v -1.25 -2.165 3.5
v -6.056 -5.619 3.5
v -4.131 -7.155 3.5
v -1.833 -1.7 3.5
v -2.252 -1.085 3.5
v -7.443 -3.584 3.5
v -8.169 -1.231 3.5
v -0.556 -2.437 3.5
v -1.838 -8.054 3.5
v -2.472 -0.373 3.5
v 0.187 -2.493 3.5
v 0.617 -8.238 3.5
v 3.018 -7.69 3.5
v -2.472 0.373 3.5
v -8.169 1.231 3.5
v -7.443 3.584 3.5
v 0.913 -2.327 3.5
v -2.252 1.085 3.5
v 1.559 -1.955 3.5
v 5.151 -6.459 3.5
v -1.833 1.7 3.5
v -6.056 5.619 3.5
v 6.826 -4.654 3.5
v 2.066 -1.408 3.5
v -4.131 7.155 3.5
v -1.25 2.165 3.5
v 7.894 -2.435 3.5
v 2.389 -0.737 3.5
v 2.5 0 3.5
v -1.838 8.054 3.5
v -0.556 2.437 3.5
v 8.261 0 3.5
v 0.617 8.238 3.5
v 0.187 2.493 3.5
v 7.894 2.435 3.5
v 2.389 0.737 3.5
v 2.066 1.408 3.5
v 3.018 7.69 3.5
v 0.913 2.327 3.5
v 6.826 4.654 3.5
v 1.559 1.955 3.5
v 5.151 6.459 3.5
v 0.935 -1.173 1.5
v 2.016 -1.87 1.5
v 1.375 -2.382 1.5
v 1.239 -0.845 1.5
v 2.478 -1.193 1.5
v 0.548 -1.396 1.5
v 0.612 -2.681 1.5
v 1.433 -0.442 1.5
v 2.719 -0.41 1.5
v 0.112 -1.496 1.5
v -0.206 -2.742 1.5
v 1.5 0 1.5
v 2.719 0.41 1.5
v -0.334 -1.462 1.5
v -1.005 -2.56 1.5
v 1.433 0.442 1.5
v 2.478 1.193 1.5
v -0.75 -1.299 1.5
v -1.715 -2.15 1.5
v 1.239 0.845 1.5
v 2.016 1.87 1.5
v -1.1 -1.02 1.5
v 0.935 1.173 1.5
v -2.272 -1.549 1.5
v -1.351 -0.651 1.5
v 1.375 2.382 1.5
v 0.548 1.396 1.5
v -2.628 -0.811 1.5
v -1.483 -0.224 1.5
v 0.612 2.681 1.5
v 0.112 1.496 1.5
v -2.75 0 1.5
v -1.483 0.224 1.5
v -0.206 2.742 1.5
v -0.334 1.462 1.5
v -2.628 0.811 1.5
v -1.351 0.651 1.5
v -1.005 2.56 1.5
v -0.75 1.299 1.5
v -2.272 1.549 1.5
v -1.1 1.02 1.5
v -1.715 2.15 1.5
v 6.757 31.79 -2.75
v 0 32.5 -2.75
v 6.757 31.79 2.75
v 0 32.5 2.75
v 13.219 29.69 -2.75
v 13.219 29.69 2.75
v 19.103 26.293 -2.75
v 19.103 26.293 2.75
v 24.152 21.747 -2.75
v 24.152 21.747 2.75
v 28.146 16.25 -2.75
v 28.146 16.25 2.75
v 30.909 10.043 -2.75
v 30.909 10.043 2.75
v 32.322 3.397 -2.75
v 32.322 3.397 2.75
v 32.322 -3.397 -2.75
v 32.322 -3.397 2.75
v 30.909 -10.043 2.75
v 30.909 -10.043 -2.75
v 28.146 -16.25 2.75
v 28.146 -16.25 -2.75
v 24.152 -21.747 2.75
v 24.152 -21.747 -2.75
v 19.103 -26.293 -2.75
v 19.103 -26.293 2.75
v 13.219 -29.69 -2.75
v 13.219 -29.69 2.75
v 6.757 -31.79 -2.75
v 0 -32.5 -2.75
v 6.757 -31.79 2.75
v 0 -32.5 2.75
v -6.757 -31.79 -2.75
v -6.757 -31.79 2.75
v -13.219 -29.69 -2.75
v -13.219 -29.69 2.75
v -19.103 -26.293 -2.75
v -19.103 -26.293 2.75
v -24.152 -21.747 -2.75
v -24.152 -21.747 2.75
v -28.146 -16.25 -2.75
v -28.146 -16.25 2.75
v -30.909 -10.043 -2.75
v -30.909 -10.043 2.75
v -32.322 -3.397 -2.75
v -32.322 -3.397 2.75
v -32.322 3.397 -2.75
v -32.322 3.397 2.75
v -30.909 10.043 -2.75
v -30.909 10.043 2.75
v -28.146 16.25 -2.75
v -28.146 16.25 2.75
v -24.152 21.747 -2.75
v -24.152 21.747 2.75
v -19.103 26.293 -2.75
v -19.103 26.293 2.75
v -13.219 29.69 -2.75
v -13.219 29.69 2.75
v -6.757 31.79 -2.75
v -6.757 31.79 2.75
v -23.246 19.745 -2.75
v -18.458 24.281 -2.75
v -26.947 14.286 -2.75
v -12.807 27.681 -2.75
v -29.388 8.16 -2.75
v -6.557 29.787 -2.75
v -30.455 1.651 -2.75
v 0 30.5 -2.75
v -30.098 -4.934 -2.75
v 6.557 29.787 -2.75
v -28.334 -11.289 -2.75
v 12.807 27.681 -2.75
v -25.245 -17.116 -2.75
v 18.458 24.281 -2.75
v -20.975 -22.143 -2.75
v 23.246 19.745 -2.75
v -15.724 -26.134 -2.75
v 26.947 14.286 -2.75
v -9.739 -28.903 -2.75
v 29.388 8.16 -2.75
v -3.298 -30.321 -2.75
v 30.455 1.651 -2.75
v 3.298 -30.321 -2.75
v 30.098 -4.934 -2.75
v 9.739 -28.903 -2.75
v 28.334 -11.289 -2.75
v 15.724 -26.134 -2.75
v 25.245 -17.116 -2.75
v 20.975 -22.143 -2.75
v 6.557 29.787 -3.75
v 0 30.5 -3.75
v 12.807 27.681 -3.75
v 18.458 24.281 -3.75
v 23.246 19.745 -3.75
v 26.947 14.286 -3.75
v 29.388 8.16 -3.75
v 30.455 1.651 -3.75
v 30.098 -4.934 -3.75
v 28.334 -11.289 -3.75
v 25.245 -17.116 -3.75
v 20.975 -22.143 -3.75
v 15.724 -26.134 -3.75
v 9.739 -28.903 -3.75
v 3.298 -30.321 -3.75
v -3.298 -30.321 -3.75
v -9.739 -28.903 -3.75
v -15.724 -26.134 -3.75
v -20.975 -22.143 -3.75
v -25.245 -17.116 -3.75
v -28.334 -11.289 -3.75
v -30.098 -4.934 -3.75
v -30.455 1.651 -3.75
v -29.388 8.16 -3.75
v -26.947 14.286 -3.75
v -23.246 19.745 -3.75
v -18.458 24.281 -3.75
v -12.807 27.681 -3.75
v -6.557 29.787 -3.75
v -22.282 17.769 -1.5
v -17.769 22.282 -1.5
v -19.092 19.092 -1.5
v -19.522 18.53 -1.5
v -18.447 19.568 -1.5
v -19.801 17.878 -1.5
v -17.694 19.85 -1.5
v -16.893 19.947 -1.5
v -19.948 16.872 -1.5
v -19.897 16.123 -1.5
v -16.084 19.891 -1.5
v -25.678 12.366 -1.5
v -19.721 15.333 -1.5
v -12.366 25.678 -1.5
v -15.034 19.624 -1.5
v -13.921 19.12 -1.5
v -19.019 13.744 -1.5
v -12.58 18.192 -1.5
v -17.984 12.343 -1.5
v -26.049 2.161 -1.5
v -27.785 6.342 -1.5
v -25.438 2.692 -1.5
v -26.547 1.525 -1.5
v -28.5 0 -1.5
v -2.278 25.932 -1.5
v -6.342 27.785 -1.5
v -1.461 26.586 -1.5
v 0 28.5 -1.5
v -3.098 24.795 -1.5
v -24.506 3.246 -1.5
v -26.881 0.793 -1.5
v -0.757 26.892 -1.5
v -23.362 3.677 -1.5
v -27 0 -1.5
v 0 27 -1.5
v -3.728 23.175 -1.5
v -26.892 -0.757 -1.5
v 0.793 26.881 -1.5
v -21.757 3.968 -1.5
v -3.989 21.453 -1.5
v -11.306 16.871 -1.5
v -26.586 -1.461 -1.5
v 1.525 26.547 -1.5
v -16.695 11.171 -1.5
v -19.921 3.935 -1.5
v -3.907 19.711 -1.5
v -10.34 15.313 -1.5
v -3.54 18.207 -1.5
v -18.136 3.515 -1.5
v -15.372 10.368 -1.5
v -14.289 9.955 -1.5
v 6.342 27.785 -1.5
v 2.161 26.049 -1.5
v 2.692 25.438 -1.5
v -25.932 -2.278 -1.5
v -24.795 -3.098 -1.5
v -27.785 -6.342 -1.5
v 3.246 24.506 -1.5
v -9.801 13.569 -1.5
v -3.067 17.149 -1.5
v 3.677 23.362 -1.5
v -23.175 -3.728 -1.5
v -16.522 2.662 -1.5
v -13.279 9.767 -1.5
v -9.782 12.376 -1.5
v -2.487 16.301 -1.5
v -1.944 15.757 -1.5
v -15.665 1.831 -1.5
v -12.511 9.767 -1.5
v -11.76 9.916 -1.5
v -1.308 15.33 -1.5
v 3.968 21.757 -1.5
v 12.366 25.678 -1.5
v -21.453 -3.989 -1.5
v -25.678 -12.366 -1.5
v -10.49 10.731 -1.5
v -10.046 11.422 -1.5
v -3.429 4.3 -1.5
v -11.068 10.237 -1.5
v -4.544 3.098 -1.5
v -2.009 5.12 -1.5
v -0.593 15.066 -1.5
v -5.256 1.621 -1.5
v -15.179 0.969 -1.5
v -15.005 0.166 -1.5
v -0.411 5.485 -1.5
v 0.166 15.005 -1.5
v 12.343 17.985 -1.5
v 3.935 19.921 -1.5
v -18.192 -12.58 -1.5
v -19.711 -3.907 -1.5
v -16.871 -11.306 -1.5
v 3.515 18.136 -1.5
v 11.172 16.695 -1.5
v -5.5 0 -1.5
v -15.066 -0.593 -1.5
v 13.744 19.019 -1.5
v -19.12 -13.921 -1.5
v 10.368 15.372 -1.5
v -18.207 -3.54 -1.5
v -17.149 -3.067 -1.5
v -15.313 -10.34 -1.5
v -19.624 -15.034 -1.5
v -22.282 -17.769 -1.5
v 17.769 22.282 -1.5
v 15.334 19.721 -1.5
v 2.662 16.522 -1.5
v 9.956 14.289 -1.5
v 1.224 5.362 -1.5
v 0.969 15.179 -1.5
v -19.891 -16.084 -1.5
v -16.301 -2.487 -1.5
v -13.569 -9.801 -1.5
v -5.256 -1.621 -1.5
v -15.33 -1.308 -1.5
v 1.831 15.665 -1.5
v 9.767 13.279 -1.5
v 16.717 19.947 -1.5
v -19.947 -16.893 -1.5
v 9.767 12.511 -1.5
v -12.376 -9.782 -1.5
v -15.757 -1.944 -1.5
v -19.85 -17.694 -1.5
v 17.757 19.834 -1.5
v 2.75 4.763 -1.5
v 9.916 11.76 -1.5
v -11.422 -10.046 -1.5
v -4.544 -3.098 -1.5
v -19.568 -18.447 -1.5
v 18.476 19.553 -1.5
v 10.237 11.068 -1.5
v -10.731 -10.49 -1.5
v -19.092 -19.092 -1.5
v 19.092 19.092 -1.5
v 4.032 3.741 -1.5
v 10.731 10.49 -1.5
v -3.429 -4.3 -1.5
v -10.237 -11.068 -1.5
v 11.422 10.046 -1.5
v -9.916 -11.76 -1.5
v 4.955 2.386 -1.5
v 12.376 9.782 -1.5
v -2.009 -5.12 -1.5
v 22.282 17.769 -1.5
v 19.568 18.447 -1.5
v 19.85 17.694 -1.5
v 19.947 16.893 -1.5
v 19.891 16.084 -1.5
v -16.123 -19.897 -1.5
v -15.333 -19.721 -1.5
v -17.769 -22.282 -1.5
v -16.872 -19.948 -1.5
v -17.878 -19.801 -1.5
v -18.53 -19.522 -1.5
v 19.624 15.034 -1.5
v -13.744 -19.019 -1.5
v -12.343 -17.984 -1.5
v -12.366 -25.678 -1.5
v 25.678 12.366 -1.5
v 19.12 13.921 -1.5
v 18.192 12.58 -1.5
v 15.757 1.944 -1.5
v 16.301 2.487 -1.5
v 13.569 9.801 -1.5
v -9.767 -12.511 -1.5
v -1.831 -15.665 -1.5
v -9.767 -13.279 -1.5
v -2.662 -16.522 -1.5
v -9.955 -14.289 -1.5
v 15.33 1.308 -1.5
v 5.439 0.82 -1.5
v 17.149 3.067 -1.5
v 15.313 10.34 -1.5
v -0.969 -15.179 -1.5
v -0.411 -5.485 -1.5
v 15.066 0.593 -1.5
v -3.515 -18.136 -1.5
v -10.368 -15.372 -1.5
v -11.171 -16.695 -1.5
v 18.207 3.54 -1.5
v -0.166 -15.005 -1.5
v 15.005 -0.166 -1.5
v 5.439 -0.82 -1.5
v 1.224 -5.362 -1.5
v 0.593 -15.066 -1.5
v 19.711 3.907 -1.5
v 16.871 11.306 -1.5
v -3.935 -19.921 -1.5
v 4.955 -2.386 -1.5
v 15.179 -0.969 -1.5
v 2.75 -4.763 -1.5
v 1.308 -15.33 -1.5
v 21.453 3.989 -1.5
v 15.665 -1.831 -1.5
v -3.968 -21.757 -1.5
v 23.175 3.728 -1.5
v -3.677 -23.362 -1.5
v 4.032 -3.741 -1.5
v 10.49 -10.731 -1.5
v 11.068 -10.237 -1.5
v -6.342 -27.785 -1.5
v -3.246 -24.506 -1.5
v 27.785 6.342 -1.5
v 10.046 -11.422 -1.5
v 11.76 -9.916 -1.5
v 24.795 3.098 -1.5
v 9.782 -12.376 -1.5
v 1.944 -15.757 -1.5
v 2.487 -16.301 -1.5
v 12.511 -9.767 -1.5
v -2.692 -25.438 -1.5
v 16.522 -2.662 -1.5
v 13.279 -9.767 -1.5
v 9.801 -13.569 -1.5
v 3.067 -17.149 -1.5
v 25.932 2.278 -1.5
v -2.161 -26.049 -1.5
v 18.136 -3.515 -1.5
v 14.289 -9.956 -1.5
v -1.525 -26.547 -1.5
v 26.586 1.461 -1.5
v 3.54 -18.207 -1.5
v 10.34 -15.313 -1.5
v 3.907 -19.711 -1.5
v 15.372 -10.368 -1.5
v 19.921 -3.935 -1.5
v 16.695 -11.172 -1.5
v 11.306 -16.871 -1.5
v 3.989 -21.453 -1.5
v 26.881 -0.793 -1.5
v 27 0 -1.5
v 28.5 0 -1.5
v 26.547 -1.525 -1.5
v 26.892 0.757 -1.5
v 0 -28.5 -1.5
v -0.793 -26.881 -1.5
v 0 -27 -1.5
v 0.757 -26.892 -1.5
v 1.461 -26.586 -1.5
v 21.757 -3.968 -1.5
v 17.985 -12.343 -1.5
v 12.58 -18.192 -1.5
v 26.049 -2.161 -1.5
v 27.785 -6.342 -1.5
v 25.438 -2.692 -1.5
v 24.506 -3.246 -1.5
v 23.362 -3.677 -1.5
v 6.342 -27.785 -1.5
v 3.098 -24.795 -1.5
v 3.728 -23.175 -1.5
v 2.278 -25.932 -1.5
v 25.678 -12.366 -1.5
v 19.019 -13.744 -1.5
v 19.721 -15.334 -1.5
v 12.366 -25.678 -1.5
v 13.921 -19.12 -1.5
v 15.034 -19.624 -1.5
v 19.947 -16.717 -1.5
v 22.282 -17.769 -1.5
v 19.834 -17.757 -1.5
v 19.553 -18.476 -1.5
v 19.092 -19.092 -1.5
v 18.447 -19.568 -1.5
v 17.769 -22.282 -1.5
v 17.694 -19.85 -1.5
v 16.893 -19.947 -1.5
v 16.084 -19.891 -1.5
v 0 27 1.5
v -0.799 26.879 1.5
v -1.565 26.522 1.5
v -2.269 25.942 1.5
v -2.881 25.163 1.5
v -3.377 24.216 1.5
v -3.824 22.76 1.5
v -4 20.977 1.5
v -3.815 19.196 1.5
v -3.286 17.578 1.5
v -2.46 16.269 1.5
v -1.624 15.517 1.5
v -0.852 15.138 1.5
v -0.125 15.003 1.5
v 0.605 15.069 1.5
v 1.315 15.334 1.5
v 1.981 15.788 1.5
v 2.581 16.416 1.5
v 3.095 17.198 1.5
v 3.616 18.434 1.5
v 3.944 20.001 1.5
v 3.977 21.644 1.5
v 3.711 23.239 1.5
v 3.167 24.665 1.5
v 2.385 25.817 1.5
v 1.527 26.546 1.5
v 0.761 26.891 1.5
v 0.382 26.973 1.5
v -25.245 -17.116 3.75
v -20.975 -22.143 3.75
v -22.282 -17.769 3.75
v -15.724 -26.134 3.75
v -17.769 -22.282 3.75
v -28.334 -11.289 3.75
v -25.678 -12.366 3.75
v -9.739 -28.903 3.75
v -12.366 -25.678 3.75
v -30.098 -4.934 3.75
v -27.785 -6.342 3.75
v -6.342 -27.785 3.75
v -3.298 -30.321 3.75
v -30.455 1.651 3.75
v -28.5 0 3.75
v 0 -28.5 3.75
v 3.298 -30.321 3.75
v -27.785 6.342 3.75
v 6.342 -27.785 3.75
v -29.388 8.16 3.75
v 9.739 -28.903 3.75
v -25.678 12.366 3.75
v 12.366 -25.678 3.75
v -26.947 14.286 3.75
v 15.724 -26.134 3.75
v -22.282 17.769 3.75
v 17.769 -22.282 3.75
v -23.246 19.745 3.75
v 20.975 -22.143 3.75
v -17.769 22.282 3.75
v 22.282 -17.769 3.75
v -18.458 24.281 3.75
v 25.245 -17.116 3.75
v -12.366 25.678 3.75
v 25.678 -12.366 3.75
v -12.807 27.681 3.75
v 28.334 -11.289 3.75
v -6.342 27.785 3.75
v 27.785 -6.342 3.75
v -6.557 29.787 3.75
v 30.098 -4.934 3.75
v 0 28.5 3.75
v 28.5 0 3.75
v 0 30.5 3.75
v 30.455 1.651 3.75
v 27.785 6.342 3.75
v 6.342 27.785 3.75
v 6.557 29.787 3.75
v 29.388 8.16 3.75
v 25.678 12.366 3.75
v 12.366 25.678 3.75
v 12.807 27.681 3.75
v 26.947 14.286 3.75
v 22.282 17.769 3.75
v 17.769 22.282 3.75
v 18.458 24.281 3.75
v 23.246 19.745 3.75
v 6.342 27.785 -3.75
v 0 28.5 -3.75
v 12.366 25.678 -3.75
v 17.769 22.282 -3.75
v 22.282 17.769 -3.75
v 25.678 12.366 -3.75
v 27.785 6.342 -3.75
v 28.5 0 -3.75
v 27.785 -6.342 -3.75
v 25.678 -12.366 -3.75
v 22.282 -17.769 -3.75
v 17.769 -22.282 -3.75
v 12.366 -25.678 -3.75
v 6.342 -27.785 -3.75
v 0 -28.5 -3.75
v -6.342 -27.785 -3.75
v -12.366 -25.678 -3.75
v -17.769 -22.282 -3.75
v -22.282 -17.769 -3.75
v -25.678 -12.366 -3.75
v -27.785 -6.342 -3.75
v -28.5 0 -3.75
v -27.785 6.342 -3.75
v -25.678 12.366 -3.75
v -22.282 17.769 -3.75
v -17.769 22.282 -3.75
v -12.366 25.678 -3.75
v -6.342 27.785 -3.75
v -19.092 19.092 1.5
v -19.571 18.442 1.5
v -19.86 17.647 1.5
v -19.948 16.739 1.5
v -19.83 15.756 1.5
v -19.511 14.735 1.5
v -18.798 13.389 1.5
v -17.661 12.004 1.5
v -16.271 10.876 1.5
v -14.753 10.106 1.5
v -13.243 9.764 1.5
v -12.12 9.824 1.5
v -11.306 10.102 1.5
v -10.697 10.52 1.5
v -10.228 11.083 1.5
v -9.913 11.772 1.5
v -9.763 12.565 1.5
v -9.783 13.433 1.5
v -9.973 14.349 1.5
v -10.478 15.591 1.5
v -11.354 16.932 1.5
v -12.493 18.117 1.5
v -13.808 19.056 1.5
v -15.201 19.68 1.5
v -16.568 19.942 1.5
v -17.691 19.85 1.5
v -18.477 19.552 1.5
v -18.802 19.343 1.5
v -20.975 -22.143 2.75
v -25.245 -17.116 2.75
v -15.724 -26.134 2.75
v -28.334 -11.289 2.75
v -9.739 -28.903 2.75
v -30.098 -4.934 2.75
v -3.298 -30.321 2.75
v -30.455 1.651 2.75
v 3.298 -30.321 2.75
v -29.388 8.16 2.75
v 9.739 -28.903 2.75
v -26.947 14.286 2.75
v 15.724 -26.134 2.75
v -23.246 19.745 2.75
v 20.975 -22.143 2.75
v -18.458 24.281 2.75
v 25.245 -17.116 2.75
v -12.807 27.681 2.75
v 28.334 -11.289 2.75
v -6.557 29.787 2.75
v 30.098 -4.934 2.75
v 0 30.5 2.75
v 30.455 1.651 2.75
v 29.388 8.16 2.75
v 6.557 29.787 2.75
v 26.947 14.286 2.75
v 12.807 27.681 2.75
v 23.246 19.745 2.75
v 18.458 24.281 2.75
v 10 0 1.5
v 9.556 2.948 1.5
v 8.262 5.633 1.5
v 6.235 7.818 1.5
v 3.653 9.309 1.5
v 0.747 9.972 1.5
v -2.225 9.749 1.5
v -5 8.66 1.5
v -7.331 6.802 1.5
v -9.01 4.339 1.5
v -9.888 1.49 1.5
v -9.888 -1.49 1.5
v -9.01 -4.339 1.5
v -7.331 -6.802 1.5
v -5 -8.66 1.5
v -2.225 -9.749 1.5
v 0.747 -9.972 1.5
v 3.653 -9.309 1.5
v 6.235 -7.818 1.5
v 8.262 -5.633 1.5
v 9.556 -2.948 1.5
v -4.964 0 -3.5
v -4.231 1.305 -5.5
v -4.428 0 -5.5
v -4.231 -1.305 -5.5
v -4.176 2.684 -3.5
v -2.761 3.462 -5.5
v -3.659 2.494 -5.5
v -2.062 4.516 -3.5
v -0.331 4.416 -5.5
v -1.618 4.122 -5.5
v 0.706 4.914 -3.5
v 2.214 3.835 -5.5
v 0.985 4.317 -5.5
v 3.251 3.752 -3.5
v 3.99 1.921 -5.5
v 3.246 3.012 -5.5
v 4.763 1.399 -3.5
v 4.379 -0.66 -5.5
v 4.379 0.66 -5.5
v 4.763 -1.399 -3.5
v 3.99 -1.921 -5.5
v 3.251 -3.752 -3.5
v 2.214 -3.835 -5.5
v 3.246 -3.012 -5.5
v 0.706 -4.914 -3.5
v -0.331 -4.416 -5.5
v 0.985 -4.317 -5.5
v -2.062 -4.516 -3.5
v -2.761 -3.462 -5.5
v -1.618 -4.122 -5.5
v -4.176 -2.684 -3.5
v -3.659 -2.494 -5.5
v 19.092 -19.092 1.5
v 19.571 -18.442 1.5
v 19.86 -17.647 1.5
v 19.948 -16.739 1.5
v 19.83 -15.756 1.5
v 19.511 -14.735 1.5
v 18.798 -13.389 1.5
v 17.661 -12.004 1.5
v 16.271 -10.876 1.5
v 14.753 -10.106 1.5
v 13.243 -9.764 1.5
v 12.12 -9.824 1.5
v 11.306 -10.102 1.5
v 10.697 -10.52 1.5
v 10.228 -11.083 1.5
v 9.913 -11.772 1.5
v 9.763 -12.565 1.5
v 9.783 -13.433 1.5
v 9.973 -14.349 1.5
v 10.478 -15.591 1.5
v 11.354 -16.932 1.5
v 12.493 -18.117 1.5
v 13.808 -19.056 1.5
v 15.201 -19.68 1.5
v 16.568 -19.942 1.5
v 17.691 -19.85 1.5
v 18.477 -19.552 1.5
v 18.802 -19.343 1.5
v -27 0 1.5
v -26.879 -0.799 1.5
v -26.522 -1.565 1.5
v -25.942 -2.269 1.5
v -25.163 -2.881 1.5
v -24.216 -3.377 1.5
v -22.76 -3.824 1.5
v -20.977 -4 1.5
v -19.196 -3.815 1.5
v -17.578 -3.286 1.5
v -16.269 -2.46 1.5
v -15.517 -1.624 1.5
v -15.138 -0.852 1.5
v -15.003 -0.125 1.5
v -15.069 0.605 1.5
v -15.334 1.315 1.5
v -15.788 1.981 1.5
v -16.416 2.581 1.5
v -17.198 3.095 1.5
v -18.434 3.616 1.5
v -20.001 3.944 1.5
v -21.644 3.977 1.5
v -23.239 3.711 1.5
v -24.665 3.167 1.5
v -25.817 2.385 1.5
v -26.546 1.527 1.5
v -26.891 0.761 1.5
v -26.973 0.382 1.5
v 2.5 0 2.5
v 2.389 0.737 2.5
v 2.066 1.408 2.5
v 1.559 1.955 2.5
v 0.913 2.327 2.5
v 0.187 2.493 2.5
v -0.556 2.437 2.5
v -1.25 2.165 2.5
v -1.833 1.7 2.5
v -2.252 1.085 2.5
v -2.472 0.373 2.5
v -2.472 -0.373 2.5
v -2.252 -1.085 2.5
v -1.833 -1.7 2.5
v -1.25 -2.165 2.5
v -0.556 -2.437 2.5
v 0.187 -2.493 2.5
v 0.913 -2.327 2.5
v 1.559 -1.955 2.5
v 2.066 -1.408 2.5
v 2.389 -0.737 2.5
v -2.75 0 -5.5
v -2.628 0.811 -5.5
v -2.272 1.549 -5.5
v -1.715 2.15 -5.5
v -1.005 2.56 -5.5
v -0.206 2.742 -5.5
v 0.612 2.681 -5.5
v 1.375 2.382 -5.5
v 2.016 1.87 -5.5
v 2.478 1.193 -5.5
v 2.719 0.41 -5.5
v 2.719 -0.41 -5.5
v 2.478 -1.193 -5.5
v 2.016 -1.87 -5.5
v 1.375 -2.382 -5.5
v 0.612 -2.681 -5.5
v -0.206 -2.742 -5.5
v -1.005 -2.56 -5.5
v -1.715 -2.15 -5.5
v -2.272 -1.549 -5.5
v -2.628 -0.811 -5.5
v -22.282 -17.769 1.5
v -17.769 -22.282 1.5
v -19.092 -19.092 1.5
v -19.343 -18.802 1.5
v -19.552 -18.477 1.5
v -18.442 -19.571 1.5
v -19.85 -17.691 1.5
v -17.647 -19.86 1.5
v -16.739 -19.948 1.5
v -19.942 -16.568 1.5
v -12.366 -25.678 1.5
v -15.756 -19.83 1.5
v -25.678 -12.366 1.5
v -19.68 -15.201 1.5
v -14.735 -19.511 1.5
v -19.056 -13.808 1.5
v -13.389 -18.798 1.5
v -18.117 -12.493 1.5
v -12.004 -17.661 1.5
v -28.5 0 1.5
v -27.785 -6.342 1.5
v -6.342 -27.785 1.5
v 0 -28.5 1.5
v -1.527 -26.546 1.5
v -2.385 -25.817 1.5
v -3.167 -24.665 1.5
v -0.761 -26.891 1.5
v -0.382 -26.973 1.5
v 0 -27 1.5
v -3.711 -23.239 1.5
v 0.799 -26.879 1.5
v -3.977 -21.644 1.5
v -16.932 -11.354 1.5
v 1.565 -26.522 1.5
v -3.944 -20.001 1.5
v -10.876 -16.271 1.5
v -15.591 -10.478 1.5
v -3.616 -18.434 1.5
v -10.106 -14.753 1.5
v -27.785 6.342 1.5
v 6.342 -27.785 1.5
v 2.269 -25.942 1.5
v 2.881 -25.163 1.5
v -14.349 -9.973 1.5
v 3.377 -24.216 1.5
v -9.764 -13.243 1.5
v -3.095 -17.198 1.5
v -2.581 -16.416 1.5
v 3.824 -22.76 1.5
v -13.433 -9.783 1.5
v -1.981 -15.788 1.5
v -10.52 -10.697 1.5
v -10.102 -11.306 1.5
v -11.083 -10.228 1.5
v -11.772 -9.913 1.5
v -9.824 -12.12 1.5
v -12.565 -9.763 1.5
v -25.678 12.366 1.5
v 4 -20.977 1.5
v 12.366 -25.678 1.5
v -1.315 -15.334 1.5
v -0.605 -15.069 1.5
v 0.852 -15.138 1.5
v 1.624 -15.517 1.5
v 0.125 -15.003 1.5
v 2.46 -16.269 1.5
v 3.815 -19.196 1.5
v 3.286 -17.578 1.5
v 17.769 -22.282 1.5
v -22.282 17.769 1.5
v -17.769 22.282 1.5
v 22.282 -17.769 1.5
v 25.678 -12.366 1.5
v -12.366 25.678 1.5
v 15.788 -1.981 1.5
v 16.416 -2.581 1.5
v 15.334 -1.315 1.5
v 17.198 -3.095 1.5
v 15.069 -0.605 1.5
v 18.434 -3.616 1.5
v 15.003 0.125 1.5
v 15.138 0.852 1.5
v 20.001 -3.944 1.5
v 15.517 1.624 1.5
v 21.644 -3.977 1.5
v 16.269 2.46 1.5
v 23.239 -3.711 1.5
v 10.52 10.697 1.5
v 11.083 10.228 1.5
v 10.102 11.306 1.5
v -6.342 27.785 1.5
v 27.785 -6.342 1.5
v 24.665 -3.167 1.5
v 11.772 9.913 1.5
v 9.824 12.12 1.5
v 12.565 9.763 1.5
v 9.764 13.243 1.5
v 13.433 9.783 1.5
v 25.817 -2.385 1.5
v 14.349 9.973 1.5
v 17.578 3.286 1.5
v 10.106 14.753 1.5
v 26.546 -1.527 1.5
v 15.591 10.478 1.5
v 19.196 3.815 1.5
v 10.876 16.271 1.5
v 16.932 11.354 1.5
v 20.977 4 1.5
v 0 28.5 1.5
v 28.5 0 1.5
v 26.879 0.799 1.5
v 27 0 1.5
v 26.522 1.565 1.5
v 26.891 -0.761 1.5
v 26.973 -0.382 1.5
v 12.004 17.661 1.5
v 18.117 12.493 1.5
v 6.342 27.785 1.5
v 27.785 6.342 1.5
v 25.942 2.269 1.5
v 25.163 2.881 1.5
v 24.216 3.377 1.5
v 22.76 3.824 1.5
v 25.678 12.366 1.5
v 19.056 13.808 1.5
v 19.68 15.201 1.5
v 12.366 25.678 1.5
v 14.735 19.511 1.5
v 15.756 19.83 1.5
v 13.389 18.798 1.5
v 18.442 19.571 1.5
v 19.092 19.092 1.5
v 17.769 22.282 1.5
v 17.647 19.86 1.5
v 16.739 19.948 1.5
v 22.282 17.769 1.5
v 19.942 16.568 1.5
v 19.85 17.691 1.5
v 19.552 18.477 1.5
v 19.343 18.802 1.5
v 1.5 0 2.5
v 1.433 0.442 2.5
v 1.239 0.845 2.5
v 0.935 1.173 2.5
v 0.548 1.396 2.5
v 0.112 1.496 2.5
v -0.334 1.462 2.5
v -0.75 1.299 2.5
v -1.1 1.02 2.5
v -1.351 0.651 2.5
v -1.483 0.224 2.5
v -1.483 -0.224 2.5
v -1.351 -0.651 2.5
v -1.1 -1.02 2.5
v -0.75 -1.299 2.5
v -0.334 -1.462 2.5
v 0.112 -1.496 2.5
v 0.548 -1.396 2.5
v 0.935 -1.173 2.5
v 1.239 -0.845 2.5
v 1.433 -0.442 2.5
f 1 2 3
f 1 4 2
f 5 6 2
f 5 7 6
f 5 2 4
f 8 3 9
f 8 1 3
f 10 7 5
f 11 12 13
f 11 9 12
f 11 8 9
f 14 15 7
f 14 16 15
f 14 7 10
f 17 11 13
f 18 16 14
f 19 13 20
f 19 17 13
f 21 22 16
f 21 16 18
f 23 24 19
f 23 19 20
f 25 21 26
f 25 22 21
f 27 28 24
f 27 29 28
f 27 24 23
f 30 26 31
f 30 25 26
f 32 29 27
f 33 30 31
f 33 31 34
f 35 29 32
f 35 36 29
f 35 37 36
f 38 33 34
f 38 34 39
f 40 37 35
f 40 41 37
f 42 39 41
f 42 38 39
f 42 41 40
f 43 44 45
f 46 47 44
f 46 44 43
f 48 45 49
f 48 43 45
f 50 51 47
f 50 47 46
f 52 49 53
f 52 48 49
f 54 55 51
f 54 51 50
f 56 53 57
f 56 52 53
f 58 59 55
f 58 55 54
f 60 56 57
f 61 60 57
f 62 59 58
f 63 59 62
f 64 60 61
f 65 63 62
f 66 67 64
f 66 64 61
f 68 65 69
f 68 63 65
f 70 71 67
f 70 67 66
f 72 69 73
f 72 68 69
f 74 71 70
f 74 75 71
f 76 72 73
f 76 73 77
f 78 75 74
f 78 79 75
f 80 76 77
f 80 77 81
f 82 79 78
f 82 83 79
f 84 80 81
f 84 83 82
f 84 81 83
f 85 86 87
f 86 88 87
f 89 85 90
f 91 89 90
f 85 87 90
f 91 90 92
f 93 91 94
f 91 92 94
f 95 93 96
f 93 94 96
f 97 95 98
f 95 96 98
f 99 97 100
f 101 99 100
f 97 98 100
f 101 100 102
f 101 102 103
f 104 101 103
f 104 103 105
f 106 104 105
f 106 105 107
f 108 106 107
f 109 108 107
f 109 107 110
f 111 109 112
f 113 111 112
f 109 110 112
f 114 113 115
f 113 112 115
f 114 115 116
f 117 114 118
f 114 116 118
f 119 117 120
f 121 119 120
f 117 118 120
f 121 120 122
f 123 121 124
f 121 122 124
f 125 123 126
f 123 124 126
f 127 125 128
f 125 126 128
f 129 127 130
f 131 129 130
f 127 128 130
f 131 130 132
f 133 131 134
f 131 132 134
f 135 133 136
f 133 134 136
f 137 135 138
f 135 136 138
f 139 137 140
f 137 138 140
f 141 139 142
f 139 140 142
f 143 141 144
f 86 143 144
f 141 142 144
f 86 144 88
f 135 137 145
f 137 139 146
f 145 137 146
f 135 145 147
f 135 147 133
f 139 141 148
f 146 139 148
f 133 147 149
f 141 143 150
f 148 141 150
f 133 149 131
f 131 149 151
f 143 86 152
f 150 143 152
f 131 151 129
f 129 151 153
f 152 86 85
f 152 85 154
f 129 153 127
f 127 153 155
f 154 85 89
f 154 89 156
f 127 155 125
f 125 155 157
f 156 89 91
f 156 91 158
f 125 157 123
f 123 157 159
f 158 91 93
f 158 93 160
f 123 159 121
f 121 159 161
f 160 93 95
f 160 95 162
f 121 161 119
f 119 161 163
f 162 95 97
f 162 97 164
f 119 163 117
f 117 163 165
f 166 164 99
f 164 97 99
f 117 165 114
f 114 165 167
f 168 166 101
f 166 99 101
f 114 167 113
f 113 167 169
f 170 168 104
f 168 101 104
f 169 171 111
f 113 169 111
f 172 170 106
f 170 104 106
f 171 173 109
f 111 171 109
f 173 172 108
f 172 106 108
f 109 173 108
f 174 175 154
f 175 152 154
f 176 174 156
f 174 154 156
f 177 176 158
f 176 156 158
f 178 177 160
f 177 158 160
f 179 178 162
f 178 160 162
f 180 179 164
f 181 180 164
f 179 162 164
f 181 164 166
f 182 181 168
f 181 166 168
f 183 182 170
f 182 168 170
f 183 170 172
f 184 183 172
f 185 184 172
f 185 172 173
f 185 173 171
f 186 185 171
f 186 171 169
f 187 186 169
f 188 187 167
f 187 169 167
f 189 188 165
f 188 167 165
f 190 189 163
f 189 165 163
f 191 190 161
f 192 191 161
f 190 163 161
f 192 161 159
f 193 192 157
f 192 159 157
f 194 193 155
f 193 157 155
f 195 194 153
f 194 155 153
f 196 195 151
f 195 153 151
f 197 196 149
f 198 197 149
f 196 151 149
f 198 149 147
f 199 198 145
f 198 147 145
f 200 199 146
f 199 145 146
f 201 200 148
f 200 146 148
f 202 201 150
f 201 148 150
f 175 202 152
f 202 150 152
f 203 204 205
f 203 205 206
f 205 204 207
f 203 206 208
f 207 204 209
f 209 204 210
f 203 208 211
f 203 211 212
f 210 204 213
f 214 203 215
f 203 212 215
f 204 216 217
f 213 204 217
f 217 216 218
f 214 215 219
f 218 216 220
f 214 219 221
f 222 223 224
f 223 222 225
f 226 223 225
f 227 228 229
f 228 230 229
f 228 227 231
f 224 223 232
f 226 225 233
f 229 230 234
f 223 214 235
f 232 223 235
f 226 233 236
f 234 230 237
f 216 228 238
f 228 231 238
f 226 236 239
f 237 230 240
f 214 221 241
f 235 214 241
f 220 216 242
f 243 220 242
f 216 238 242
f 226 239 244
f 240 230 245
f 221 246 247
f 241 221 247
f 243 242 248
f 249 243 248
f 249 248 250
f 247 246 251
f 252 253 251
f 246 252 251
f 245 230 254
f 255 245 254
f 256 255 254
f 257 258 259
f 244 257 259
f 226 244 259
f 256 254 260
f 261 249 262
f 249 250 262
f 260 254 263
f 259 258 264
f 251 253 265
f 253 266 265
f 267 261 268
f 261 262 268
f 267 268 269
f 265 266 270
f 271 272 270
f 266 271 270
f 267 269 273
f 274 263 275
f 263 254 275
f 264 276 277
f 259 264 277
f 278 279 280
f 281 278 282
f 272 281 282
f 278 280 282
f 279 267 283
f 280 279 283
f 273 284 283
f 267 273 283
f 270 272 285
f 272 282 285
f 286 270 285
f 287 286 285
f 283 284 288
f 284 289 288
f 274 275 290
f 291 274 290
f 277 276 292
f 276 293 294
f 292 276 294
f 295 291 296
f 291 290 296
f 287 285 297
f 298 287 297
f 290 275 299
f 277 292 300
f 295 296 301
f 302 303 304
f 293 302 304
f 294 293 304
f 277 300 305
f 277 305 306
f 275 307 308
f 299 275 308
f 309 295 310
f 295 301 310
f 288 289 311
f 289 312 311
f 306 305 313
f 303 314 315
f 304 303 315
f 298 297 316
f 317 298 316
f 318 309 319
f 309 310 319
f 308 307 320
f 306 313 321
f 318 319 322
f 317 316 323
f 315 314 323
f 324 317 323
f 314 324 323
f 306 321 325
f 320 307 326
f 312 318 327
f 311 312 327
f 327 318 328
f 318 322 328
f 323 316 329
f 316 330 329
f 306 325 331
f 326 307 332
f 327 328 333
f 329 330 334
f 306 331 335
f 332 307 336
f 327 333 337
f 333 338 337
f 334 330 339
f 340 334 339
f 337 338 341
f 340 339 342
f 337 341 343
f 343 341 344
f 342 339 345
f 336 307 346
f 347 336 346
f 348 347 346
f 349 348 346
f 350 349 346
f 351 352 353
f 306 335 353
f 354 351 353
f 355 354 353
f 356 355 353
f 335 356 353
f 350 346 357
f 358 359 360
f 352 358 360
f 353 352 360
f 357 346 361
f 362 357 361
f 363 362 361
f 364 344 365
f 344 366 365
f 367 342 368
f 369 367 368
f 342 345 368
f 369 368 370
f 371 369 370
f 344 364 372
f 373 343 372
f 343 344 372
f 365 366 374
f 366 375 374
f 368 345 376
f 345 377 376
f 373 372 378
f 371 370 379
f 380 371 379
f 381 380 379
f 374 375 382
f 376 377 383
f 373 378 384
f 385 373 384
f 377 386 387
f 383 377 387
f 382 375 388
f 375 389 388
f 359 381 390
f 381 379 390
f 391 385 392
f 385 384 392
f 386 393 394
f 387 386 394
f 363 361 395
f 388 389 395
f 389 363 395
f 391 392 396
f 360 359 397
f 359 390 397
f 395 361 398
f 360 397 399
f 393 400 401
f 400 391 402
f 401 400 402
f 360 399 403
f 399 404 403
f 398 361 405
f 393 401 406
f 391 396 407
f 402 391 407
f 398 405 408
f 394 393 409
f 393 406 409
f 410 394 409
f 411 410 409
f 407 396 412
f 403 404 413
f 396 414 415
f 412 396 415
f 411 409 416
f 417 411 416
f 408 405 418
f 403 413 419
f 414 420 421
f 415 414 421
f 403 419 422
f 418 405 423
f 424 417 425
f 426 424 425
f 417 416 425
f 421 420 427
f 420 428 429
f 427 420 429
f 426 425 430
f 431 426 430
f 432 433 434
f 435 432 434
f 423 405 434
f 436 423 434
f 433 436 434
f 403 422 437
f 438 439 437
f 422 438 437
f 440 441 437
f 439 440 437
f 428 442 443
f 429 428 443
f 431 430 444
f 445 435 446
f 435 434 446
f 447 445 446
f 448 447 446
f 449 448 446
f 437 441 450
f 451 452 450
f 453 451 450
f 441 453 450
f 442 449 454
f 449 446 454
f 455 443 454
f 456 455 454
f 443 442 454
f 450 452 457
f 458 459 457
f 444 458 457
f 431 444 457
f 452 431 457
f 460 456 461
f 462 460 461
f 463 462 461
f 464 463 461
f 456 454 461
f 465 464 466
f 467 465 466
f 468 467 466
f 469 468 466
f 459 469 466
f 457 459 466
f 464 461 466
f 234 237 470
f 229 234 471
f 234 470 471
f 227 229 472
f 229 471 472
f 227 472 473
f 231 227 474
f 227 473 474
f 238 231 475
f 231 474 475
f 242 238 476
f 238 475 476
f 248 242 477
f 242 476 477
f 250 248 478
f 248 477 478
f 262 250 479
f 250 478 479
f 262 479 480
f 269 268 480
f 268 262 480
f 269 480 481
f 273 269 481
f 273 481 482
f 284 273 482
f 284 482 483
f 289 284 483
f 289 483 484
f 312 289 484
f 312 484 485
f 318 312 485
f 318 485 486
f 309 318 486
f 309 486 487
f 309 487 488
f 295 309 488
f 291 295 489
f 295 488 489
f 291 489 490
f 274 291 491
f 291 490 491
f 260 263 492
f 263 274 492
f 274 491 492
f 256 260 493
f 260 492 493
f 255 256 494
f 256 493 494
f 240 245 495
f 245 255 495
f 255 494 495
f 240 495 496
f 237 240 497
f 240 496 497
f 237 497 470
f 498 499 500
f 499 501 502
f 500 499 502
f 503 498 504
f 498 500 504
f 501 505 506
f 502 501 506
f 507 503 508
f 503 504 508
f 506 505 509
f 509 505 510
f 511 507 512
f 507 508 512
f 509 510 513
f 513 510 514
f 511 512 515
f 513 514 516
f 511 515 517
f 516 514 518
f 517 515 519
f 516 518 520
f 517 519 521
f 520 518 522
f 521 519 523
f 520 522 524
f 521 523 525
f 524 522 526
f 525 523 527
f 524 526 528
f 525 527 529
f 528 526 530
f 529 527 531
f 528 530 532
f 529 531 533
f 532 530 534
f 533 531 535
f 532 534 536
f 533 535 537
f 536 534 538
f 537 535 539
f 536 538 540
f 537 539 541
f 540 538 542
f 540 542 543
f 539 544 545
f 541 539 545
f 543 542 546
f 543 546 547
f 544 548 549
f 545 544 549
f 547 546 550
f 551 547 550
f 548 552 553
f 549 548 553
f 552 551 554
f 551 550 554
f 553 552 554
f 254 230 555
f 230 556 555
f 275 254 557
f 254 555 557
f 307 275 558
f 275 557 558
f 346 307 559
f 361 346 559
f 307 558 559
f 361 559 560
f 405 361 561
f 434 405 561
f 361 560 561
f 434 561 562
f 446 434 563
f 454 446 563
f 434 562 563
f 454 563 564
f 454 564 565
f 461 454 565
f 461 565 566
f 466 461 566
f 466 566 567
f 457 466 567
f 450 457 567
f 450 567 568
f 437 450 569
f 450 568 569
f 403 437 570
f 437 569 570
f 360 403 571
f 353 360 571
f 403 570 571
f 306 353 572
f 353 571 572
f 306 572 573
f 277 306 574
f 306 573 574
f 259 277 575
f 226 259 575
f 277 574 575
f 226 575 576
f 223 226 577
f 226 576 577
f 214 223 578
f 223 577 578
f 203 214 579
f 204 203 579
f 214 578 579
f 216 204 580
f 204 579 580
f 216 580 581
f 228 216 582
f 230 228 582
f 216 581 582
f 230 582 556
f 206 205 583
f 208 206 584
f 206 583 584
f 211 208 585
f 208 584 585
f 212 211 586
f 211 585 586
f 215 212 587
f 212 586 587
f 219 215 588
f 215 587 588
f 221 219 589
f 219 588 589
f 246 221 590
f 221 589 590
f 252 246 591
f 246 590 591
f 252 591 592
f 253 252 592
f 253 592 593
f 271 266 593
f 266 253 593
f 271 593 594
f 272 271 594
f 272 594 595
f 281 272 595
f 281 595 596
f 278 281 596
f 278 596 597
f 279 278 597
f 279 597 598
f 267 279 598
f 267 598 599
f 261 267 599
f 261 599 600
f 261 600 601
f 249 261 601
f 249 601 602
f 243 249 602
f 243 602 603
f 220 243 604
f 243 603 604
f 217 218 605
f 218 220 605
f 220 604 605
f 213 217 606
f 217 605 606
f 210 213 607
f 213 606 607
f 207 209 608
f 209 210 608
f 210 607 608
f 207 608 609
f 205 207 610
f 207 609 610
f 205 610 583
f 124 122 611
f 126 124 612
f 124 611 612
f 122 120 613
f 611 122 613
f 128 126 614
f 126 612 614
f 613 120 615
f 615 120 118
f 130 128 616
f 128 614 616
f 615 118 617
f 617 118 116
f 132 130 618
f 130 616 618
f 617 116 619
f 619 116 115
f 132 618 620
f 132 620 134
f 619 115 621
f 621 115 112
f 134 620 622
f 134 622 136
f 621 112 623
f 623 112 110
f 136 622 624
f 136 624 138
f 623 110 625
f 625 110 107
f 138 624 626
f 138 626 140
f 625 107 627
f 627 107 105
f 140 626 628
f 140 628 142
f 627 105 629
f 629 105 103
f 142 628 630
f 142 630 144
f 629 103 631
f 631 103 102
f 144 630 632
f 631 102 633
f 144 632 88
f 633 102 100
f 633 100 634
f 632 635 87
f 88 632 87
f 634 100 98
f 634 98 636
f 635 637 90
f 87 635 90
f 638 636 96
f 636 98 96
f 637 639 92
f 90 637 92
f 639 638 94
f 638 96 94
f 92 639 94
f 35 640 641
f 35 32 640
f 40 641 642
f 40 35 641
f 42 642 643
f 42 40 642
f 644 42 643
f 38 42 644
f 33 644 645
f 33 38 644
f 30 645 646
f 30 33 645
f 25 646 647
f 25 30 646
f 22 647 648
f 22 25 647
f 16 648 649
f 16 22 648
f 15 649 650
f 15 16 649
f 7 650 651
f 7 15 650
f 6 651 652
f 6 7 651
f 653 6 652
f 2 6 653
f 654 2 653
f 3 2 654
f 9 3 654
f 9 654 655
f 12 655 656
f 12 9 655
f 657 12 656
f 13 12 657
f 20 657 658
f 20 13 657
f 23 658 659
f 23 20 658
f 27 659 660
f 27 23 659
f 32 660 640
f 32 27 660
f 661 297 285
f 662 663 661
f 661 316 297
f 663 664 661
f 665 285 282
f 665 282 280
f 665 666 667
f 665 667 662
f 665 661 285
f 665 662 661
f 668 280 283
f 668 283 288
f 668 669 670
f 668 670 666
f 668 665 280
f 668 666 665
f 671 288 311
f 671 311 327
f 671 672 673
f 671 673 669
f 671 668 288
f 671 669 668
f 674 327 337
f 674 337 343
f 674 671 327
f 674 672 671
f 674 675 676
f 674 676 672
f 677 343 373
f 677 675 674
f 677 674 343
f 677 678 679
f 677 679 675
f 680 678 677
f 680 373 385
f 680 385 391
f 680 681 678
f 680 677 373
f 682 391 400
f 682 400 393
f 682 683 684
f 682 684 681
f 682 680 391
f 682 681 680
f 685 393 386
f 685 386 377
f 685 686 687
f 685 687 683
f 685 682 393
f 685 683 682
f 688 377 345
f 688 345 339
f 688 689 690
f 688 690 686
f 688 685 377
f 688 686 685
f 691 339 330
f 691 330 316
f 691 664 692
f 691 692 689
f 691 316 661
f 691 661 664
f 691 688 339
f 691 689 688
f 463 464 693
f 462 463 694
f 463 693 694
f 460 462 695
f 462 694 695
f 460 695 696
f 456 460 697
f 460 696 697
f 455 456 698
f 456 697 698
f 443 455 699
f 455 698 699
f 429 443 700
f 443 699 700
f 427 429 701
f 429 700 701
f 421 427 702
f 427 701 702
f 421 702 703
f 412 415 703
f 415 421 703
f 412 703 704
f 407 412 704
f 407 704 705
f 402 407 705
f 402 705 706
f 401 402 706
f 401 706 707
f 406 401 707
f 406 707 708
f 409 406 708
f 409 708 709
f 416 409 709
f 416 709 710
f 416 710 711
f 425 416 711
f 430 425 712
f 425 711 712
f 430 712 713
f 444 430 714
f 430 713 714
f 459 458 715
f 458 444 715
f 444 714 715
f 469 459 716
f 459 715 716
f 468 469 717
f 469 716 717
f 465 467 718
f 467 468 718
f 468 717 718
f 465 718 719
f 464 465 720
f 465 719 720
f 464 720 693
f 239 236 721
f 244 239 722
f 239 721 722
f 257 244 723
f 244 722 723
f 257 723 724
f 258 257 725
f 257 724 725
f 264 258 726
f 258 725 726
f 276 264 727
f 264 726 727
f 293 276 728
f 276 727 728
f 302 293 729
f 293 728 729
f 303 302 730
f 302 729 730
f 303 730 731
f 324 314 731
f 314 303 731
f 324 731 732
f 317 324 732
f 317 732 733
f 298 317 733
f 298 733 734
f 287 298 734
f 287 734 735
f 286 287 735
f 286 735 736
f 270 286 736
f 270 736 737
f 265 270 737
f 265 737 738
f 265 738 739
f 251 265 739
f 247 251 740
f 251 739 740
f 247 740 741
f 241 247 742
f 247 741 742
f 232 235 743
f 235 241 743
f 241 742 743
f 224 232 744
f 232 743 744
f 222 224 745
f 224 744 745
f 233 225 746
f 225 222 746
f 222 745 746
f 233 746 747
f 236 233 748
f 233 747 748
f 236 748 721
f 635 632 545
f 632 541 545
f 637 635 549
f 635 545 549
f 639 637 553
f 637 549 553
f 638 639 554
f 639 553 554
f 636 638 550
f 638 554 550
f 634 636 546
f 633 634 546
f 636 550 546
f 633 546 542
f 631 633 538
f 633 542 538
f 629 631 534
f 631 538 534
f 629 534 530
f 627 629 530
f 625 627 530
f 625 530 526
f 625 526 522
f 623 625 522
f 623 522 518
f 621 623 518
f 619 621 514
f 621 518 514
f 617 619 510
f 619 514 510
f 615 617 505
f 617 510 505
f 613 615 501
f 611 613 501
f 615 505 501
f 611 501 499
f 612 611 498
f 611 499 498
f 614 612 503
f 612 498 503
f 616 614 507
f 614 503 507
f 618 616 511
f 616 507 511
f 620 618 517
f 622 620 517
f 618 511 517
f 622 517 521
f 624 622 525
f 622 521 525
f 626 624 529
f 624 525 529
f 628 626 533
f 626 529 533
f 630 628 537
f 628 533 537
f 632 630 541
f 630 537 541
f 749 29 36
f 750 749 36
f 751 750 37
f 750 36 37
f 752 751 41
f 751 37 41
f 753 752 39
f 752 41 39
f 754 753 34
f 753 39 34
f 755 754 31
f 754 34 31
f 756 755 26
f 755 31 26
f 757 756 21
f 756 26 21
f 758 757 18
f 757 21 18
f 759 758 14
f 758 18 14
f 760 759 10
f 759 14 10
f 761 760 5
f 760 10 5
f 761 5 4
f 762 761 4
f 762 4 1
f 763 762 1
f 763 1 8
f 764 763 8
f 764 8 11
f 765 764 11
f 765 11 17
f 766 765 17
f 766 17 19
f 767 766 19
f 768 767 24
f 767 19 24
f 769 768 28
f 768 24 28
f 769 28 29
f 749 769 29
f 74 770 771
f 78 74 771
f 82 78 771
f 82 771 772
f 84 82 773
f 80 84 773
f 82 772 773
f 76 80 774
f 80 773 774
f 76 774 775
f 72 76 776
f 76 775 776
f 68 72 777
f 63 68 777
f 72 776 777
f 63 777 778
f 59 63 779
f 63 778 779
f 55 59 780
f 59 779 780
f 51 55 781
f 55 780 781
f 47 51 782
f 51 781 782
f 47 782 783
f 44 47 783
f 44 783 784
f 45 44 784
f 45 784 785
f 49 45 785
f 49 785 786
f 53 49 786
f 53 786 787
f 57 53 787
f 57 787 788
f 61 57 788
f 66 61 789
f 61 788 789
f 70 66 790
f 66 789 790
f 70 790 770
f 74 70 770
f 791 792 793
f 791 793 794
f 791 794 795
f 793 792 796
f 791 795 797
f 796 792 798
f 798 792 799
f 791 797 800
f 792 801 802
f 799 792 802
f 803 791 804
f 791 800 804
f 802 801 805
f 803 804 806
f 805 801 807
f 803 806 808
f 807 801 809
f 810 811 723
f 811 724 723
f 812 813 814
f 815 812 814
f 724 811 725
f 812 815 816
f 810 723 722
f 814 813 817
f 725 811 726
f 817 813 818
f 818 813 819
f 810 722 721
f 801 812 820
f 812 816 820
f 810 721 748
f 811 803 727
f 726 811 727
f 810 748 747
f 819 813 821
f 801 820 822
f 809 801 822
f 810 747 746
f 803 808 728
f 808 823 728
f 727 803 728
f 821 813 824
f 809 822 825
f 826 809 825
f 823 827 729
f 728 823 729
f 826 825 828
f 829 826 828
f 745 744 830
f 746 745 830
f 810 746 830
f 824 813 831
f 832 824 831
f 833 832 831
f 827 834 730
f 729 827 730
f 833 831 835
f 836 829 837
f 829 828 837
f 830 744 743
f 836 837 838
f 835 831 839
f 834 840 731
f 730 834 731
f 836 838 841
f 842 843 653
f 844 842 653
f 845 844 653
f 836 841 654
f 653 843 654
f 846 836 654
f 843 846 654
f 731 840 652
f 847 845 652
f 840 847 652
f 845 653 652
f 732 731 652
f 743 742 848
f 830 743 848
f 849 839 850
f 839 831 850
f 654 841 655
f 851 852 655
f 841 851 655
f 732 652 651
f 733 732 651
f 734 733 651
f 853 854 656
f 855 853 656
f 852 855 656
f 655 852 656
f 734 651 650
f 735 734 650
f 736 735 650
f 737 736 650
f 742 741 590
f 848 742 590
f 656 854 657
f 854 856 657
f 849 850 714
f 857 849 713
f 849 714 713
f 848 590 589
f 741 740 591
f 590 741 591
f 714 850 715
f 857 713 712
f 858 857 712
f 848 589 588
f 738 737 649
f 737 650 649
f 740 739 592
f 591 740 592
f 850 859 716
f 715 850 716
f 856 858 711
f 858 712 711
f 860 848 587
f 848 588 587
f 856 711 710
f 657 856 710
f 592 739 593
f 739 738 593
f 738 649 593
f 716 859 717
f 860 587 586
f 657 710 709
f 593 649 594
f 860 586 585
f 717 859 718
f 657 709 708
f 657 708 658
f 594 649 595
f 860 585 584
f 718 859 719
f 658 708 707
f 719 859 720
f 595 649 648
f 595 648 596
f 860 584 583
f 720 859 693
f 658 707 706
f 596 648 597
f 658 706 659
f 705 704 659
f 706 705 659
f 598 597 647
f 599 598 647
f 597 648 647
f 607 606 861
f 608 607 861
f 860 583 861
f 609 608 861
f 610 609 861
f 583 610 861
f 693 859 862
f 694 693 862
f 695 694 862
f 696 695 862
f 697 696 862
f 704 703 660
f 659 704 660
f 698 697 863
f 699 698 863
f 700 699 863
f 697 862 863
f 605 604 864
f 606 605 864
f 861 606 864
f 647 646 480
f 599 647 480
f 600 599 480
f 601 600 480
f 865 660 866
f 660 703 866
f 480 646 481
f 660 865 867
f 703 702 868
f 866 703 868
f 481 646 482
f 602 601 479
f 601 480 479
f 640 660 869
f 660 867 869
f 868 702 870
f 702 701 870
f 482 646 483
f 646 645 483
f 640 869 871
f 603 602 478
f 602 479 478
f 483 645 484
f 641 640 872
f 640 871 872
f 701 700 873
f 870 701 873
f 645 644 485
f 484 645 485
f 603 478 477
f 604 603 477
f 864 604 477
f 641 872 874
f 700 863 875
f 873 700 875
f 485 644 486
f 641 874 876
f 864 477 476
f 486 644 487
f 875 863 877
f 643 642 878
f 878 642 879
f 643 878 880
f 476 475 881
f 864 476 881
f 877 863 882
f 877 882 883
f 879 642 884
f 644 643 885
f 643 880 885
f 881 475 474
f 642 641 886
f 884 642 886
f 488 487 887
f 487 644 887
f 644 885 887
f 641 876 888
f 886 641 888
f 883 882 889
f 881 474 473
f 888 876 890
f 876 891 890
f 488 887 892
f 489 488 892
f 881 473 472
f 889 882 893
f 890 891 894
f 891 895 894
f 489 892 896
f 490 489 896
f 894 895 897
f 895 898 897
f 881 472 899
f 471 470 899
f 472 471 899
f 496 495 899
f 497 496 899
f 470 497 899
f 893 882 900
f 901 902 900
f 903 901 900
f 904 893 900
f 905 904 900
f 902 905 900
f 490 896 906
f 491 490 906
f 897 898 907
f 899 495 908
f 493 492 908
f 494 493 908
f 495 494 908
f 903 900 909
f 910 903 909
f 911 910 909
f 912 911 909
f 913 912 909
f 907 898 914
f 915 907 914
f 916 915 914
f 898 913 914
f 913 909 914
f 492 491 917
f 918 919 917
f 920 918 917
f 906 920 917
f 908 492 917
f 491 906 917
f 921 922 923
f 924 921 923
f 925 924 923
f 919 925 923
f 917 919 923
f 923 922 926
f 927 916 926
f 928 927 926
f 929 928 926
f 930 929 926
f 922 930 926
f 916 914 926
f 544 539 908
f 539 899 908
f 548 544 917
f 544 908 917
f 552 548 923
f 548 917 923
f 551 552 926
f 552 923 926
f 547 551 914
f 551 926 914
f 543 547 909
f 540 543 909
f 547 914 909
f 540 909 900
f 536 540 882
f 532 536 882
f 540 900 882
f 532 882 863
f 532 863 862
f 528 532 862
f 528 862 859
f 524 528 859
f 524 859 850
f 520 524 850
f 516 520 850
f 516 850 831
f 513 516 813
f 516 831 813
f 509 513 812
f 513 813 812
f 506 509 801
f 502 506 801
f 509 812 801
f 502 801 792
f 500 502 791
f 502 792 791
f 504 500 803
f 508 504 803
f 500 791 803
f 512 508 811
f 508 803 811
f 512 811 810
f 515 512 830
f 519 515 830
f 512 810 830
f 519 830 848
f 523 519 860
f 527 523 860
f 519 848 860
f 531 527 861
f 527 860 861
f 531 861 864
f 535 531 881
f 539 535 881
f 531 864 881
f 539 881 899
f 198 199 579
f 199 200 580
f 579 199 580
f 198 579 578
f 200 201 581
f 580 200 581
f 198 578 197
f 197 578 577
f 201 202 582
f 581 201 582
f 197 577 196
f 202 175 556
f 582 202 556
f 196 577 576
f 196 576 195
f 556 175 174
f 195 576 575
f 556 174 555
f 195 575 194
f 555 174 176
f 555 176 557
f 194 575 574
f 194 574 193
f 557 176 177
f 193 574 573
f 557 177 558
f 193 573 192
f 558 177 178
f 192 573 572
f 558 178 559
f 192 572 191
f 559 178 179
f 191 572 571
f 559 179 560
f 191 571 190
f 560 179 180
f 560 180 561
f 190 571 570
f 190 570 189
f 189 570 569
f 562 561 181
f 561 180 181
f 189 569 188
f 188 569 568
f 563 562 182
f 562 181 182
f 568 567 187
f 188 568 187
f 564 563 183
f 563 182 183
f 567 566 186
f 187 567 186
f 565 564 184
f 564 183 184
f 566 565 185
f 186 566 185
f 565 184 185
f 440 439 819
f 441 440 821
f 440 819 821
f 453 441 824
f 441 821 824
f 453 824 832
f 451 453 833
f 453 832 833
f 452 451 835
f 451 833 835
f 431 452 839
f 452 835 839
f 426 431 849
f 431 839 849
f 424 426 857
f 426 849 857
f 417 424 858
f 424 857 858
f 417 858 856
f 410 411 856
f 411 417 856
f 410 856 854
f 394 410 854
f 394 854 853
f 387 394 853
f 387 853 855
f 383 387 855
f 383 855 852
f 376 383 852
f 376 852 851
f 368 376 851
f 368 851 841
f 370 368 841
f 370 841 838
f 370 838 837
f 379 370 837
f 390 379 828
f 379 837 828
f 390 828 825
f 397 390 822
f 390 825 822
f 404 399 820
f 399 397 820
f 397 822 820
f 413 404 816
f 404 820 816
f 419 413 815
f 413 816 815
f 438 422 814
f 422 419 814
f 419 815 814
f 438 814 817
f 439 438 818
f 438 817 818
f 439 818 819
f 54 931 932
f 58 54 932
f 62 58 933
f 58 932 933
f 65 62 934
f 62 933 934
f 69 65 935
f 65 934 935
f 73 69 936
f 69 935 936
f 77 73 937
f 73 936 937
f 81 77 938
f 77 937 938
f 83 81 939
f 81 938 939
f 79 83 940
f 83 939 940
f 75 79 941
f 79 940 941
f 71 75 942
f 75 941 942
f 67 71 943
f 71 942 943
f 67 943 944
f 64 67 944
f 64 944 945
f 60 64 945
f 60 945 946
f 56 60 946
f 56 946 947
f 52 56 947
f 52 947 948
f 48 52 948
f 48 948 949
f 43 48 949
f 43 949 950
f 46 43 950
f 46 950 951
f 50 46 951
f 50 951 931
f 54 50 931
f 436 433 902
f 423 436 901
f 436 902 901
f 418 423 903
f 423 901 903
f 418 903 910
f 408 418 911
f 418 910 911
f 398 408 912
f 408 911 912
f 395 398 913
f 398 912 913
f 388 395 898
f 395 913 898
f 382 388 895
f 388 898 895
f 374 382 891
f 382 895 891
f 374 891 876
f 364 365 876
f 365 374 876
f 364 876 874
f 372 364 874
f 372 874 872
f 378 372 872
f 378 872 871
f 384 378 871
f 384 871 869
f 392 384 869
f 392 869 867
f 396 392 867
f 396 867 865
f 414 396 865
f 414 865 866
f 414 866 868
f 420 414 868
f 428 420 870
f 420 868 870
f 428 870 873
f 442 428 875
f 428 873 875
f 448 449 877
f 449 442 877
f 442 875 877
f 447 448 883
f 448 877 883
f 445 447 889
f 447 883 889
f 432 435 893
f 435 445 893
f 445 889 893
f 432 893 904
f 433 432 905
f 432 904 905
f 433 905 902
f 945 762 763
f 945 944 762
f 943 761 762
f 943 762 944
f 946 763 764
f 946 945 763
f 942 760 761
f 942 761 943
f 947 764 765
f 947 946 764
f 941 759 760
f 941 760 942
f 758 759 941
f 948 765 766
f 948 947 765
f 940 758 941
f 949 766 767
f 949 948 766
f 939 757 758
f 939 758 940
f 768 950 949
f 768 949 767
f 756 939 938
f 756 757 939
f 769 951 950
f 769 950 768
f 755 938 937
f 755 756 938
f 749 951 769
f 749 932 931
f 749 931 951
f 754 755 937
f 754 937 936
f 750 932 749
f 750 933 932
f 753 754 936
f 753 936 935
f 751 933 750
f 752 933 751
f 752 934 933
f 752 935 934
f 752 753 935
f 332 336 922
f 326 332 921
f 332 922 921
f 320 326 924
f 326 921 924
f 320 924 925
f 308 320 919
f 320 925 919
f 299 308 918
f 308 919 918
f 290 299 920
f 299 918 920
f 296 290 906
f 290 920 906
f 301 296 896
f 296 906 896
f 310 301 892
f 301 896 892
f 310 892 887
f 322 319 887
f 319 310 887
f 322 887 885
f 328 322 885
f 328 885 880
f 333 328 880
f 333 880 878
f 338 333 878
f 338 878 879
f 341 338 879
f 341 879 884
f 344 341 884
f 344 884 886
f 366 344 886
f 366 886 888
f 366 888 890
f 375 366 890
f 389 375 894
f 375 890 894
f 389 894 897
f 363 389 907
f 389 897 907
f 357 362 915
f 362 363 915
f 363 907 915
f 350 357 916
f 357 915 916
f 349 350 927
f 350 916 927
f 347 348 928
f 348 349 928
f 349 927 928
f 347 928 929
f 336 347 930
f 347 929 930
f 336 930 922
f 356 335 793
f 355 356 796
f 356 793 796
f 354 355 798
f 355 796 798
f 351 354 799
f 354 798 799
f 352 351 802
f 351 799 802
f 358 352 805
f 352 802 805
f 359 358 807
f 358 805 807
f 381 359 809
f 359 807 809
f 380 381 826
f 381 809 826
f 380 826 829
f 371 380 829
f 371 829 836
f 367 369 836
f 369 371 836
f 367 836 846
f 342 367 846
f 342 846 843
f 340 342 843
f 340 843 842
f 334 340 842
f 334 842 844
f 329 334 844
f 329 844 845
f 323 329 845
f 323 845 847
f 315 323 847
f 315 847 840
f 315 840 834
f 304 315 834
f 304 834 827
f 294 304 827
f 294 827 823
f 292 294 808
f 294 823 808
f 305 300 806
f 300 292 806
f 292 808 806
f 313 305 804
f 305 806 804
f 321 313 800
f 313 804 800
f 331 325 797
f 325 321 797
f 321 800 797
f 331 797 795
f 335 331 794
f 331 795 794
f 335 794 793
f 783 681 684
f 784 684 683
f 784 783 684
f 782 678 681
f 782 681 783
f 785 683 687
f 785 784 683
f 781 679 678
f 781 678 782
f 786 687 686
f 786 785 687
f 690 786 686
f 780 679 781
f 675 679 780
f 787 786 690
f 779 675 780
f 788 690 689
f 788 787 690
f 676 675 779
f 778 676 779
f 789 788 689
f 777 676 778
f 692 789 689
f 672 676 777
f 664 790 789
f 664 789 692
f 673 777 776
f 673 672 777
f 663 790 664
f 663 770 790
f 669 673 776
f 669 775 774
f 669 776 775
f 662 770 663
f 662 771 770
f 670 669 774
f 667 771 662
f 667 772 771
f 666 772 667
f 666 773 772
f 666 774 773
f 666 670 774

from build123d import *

# Parameters (mm, degrees)
SKETCH2_R           = 10
EXTRUDE1_DEPTH      = 2
EXTRUDE1_TAPER      = 41
SKETCH3_R           = 5.5
EXTRUDE2_DEPTH      = 4
EXTRUDE2_TAPER      = 15
SKETCH4_R           = 2.5
EXTRUDE3_DEPTH      = 1
SKETCH5_R           = 1.5
EXTRUDE4_DEPTH      = 24
EXTRUDE4_DEPTH_BACK = 15
SKETCH6_RX          = 6
SKETCH6_RY          = 4
EXTRUDE5_DEPTH      = 15
CIRPATTERN2_COUNT   = 8
SKETCH7_R           = 2.75
EXTRUDE6_DEPTH      = 7


with BuildPart() as part:
    # Sketch1 → Revolve1 (revolve)
    with BuildSketch(Plane(origin=(0, 0, 0), x_dir=(0, 0, -1), z_dir=(1, 0, 0))):
        Polygon((-3.75, 28.5), (-1.5, 28.5), (-1.5, 0), (1.5, 0), (1.5, 28.5), (3.75, 28.5), (3.75, 30.5), (2.75, 30.5), (2.75, 32.5), (-2.75, 32.5), (-2.75, 30.5), (-3.75, 30.5), align=None)
    revolve(axis=Axis((0, 0, 21.188406287), (0, 0, -1)))

    # Sketch2 → Extrude1 (add)
    with BuildSketch(Plane.XY.offset(1.5)):
        Circle(SKETCH2_R)
    extrude(amount=EXTRUDE1_DEPTH, taper=EXTRUDE1_TAPER)

    # Sketch3 → Extrude2 (add)
    with BuildSketch(Plane(origin=(0, 0, -1.5), x_dir=(-1, 0, 0), z_dir=(0, 0, -1))):
        Circle(SKETCH3_R)
    extrude(amount=EXTRUDE2_DEPTH, taper=EXTRUDE2_TAPER)

    # Sketch4 → Extrude3 (cut)
    with BuildSketch(Plane.XY.offset(3.5)):
        Circle(SKETCH4_R)
    extrude(amount=-EXTRUDE3_DEPTH, mode=Mode.SUBTRACT)

    # Sketch5 → Extrude4 (cut, two sides)
    with BuildSketch(Plane.XY.offset(2.5)) as extrude4_sk:
        Circle(SKETCH5_R)
    extrude(amount=EXTRUDE4_DEPTH, mode=Mode.SUBTRACT)
    extrude(extrude4_sk.sketch, amount=-EXTRUDE4_DEPTH_BACK, mode=Mode.SUBTRACT)

    # Sketch6 → Extrude5 (cut)
    with BuildSketch(Plane.XY.offset(1.5)):
        with Locations(Location((0, 21), (0, 0, 90))):
            Ellipse(SKETCH6_RX, SKETCH6_RY)
    extrude5 = extrude(amount=-EXTRUDE5_DEPTH, mode=Mode.SUBTRACT)

    # CirPattern2: Extrude5 ×8 about axis
    cirpattern2_axis = Axis((0, 0, 21.188406287), (0, 0, 1))
    for i in range(1, CIRPATTERN2_COUNT):
        add(extrude5.rotate(cirpattern2_axis, i * 360 / CIRPATTERN2_COUNT), mode=Mode.SUBTRACT)

    # Sketch7 → Extrude6 (cut)
    with BuildSketch(Plane(origin=(0, 0, -5.5), x_dir=(-1, 0, 0), z_dir=(0, 0, -1))):
        Circle(SKETCH7_R)
    extrude(amount=-EXTRUDE6_DEPTH, mode=Mode.SUBTRACT)


solid = part.part
